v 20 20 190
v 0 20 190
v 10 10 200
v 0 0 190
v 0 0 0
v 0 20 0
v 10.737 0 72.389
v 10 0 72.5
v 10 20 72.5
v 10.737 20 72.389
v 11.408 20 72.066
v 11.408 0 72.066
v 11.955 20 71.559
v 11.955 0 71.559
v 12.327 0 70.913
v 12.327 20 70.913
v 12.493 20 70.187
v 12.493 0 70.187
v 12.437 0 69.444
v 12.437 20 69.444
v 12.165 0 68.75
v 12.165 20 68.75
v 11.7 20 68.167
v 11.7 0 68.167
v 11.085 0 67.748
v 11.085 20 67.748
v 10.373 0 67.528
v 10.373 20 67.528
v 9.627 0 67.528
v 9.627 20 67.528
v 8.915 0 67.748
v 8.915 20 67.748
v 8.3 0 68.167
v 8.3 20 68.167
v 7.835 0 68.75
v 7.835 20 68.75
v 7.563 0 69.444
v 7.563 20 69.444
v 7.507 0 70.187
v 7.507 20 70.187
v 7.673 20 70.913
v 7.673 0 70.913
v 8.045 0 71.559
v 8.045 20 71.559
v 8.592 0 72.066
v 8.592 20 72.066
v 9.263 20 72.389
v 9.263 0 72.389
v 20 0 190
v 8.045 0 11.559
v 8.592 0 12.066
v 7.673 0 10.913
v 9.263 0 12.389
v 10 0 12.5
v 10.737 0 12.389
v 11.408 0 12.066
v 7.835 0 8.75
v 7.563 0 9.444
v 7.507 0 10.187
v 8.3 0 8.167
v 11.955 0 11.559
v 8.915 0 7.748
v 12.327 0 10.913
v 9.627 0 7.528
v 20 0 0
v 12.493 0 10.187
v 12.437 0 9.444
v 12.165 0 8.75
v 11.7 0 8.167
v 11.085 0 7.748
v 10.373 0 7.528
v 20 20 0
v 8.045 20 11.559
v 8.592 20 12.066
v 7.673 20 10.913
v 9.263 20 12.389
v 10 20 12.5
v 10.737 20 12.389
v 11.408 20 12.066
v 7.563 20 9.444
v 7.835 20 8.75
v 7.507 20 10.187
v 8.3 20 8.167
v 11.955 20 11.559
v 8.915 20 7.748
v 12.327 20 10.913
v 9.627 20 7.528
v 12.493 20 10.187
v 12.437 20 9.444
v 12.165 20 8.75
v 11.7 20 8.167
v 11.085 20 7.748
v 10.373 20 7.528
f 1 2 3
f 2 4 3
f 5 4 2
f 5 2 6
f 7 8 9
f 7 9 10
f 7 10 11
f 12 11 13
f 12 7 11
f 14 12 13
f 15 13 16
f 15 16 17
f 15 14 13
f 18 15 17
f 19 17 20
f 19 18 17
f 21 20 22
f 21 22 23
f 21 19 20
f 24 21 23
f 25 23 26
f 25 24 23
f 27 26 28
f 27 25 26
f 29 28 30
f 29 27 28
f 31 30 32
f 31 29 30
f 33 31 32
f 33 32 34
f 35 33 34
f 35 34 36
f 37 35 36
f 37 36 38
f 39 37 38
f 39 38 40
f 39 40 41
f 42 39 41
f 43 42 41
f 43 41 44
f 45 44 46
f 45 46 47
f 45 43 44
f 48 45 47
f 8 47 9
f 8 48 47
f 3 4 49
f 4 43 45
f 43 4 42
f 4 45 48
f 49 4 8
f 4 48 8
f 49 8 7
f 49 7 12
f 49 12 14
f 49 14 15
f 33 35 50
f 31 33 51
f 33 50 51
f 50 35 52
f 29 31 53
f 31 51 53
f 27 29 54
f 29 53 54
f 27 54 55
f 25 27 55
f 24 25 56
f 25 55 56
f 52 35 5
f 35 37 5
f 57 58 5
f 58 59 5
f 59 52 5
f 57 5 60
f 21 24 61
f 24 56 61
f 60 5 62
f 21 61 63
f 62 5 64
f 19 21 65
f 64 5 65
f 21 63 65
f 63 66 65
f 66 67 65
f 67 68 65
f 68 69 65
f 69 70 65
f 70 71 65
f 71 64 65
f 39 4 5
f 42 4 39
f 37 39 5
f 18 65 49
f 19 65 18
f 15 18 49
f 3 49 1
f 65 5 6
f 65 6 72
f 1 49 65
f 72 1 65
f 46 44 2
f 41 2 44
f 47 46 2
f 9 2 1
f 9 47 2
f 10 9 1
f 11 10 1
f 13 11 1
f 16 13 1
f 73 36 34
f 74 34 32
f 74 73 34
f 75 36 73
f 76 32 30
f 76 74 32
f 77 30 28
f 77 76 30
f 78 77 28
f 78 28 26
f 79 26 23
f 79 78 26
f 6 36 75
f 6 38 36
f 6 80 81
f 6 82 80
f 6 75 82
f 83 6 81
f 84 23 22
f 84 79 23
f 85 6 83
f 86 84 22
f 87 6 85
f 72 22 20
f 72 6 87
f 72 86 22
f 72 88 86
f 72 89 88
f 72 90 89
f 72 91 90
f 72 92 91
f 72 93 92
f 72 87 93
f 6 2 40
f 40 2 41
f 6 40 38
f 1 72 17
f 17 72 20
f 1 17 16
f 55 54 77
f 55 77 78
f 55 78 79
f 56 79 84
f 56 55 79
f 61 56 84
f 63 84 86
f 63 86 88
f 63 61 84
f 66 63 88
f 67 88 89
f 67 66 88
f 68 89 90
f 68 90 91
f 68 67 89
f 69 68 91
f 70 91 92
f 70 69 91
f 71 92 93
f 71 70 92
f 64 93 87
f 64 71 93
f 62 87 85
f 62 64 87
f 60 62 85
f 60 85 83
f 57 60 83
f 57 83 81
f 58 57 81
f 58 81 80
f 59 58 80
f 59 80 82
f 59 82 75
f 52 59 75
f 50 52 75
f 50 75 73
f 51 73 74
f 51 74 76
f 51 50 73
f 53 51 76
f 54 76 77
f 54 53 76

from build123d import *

# Parameters (mm, degrees)
SKETCH1_W           = 20
SKETCH1_H           = 200
SKETCH1_R           = 2.5
BOSS_EXTRUDE1_DEPTH = 20
CHAMFER1_SIZE       = 10


with BuildPart() as part:
    # Sketch1 → Boss-Extrude1 (new body)
    with BuildSketch(Plane(origin=(0, 0, 0), x_dir=(1, 0, 0), z_dir=(0, 1, 0))):
        with Locations((10, -100)):
            Rectangle(SKETCH1_W, SKETCH1_H)
        with Locations(Location((10, -10, 0), (0, 0, 270))):
            Circle(SKETCH1_R, mode=Mode.SUBTRACT)
        with Locations(Location((10, -70, 0), (0, 0, 270))):
            Circle(SKETCH1_R, mode=Mode.SUBTRACT)
    extrude(amount=BOSS_EXTRUDE1_DEPTH)

    # Chamfer1
    chamfer1_edges = [part.edges().sort_by_distance(p)[0] for p in [
        (10, 0, 200),
        (10, 20, 200),
        (20, 10, 200),
        (0, 10, 200),
    ]]
    chamfer(chamfer1_edges, length=CHAMFER1_SIZE - 0.0001)  # a hair under: the kernel refuses the full size


solid = part.part
